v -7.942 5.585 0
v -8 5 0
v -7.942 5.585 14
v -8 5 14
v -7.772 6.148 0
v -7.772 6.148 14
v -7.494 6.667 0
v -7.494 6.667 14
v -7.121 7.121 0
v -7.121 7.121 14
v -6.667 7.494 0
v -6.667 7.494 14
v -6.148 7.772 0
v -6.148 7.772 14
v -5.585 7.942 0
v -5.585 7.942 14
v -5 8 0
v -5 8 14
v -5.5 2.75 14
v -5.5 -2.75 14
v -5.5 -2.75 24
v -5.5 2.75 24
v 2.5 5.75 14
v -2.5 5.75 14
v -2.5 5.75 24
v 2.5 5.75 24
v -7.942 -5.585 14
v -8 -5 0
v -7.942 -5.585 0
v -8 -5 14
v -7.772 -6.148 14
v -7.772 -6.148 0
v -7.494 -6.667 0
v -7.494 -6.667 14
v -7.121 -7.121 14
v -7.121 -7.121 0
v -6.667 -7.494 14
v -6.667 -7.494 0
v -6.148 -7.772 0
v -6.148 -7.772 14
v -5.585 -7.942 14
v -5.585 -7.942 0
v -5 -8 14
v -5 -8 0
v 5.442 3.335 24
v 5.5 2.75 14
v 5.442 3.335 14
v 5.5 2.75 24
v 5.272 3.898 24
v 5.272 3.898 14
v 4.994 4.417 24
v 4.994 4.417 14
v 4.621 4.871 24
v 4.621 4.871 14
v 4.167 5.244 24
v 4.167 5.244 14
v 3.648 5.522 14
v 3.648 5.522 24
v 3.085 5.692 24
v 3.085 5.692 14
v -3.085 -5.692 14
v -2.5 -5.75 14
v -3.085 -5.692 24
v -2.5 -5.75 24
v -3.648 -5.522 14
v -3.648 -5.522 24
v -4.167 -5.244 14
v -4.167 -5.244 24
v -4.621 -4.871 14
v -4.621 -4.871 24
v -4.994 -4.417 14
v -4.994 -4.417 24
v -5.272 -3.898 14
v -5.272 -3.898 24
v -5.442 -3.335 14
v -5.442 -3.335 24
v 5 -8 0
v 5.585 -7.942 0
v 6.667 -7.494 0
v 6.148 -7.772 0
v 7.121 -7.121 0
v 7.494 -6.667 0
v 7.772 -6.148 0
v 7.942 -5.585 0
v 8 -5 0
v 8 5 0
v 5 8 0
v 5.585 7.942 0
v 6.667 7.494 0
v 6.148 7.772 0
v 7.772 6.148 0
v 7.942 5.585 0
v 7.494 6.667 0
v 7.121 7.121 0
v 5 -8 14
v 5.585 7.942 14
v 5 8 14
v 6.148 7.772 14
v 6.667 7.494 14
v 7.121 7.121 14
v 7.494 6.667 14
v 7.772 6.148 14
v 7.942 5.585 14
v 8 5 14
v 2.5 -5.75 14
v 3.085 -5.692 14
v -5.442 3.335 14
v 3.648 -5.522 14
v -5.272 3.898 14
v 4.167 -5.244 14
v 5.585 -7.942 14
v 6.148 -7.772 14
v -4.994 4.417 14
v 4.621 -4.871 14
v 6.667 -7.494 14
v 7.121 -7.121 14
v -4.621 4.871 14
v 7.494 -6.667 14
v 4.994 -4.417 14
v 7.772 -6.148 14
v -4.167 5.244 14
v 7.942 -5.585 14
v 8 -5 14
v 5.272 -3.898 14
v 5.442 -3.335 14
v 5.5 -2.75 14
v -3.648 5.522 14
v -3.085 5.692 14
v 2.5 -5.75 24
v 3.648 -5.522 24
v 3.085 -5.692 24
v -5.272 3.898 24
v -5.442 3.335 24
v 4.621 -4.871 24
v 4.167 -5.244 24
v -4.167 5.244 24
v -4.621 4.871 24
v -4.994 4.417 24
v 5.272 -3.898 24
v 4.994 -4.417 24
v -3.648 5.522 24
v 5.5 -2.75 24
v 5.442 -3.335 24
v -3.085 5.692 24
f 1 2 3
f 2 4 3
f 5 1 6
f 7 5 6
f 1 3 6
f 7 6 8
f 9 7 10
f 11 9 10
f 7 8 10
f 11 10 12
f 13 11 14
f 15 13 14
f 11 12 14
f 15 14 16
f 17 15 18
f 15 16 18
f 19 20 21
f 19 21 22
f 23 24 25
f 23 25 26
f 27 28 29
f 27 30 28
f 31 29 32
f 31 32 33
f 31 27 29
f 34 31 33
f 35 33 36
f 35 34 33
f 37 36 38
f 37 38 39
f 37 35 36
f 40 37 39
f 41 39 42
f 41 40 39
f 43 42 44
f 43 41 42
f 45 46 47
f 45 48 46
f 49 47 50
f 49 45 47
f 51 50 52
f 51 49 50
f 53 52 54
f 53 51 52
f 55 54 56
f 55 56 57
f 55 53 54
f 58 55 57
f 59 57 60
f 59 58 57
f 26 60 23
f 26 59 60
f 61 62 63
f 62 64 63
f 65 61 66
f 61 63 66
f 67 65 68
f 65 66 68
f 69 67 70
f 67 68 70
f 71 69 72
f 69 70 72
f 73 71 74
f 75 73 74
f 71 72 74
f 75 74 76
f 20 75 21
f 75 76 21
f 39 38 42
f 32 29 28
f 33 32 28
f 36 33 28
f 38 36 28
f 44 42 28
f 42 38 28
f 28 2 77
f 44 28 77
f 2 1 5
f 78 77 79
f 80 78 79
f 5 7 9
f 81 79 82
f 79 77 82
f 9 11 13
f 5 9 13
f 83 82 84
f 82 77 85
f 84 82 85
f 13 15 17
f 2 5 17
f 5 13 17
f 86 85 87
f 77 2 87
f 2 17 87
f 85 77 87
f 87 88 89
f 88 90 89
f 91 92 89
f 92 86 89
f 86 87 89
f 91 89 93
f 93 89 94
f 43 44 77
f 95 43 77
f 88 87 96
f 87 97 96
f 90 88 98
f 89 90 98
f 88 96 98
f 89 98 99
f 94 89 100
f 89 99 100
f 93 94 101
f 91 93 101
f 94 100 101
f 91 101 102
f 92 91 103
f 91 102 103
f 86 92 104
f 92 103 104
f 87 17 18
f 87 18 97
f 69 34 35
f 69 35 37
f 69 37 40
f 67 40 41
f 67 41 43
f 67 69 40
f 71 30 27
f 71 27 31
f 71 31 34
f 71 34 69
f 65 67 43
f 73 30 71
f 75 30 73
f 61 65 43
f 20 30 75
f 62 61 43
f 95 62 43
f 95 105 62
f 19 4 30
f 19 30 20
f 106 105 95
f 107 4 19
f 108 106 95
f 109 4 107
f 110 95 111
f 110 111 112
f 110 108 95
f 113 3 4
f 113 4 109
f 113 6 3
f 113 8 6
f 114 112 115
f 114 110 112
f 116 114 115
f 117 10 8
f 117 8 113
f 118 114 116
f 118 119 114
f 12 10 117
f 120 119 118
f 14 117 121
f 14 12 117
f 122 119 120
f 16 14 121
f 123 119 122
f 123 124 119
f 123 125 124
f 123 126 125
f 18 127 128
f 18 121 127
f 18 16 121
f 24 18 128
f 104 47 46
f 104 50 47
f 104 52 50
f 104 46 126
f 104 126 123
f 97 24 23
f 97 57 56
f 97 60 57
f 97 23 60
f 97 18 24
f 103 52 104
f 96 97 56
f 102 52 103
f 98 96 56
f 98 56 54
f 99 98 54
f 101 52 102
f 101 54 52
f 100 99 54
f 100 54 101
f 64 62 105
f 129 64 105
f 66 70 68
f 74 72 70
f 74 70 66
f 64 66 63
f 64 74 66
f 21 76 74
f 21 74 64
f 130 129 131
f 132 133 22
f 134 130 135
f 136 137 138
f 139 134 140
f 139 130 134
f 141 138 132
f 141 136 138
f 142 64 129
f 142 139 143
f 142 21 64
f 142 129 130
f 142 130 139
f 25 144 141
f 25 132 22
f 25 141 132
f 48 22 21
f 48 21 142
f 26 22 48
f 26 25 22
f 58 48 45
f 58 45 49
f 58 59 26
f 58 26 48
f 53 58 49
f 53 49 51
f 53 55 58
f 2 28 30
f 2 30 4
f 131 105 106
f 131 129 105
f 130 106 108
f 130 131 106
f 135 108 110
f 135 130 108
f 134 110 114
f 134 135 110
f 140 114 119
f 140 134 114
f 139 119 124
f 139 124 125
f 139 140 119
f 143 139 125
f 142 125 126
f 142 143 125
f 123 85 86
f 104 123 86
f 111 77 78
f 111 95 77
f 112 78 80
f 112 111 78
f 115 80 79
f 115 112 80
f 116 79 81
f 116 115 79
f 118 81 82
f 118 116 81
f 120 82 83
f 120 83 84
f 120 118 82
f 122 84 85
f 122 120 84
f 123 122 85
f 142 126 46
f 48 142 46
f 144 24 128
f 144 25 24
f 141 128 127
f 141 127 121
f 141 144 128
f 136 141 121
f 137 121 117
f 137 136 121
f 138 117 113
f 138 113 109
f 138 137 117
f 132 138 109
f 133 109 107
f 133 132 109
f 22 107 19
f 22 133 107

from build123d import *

# Parameters (mm, degrees)
F0_W     = 16
F0_H     = 16
F1_DEPTH = 14
F2_W     = 11
F2_H     = 11.5
F3_DEPTH = 10
F4_R     = 3


with BuildPart() as f1:
    # F0 (on Top) → F1 (new body)
    with BuildSketch(Plane.XY):
        Rectangle(F0_W, F0_H)
    extrude(amount=F1_DEPTH)

    # F2 (on face) → F3 (join)
    with BuildSketch(Plane.XY.offset(14)):
        Rectangle(F2_W, F2_H)
    extrude(amount=F3_DEPTH)

    # F4
    f4_edges = [f1.edges().sort_by_distance(p)[0] for p in [
        (5.5, -5.75, 19),
        (5.5, 5.75, 19),
        (-5.5, -5.75, 19),
        (-8, -8, 7),
        (8, -8, 7),
        (8, 8, 7),
        (-8, 8, 7),
        (-5.5, 5.75, 19),
    ]]
    fillet(f4_edges, radius=F4_R)


solid = f1.part
